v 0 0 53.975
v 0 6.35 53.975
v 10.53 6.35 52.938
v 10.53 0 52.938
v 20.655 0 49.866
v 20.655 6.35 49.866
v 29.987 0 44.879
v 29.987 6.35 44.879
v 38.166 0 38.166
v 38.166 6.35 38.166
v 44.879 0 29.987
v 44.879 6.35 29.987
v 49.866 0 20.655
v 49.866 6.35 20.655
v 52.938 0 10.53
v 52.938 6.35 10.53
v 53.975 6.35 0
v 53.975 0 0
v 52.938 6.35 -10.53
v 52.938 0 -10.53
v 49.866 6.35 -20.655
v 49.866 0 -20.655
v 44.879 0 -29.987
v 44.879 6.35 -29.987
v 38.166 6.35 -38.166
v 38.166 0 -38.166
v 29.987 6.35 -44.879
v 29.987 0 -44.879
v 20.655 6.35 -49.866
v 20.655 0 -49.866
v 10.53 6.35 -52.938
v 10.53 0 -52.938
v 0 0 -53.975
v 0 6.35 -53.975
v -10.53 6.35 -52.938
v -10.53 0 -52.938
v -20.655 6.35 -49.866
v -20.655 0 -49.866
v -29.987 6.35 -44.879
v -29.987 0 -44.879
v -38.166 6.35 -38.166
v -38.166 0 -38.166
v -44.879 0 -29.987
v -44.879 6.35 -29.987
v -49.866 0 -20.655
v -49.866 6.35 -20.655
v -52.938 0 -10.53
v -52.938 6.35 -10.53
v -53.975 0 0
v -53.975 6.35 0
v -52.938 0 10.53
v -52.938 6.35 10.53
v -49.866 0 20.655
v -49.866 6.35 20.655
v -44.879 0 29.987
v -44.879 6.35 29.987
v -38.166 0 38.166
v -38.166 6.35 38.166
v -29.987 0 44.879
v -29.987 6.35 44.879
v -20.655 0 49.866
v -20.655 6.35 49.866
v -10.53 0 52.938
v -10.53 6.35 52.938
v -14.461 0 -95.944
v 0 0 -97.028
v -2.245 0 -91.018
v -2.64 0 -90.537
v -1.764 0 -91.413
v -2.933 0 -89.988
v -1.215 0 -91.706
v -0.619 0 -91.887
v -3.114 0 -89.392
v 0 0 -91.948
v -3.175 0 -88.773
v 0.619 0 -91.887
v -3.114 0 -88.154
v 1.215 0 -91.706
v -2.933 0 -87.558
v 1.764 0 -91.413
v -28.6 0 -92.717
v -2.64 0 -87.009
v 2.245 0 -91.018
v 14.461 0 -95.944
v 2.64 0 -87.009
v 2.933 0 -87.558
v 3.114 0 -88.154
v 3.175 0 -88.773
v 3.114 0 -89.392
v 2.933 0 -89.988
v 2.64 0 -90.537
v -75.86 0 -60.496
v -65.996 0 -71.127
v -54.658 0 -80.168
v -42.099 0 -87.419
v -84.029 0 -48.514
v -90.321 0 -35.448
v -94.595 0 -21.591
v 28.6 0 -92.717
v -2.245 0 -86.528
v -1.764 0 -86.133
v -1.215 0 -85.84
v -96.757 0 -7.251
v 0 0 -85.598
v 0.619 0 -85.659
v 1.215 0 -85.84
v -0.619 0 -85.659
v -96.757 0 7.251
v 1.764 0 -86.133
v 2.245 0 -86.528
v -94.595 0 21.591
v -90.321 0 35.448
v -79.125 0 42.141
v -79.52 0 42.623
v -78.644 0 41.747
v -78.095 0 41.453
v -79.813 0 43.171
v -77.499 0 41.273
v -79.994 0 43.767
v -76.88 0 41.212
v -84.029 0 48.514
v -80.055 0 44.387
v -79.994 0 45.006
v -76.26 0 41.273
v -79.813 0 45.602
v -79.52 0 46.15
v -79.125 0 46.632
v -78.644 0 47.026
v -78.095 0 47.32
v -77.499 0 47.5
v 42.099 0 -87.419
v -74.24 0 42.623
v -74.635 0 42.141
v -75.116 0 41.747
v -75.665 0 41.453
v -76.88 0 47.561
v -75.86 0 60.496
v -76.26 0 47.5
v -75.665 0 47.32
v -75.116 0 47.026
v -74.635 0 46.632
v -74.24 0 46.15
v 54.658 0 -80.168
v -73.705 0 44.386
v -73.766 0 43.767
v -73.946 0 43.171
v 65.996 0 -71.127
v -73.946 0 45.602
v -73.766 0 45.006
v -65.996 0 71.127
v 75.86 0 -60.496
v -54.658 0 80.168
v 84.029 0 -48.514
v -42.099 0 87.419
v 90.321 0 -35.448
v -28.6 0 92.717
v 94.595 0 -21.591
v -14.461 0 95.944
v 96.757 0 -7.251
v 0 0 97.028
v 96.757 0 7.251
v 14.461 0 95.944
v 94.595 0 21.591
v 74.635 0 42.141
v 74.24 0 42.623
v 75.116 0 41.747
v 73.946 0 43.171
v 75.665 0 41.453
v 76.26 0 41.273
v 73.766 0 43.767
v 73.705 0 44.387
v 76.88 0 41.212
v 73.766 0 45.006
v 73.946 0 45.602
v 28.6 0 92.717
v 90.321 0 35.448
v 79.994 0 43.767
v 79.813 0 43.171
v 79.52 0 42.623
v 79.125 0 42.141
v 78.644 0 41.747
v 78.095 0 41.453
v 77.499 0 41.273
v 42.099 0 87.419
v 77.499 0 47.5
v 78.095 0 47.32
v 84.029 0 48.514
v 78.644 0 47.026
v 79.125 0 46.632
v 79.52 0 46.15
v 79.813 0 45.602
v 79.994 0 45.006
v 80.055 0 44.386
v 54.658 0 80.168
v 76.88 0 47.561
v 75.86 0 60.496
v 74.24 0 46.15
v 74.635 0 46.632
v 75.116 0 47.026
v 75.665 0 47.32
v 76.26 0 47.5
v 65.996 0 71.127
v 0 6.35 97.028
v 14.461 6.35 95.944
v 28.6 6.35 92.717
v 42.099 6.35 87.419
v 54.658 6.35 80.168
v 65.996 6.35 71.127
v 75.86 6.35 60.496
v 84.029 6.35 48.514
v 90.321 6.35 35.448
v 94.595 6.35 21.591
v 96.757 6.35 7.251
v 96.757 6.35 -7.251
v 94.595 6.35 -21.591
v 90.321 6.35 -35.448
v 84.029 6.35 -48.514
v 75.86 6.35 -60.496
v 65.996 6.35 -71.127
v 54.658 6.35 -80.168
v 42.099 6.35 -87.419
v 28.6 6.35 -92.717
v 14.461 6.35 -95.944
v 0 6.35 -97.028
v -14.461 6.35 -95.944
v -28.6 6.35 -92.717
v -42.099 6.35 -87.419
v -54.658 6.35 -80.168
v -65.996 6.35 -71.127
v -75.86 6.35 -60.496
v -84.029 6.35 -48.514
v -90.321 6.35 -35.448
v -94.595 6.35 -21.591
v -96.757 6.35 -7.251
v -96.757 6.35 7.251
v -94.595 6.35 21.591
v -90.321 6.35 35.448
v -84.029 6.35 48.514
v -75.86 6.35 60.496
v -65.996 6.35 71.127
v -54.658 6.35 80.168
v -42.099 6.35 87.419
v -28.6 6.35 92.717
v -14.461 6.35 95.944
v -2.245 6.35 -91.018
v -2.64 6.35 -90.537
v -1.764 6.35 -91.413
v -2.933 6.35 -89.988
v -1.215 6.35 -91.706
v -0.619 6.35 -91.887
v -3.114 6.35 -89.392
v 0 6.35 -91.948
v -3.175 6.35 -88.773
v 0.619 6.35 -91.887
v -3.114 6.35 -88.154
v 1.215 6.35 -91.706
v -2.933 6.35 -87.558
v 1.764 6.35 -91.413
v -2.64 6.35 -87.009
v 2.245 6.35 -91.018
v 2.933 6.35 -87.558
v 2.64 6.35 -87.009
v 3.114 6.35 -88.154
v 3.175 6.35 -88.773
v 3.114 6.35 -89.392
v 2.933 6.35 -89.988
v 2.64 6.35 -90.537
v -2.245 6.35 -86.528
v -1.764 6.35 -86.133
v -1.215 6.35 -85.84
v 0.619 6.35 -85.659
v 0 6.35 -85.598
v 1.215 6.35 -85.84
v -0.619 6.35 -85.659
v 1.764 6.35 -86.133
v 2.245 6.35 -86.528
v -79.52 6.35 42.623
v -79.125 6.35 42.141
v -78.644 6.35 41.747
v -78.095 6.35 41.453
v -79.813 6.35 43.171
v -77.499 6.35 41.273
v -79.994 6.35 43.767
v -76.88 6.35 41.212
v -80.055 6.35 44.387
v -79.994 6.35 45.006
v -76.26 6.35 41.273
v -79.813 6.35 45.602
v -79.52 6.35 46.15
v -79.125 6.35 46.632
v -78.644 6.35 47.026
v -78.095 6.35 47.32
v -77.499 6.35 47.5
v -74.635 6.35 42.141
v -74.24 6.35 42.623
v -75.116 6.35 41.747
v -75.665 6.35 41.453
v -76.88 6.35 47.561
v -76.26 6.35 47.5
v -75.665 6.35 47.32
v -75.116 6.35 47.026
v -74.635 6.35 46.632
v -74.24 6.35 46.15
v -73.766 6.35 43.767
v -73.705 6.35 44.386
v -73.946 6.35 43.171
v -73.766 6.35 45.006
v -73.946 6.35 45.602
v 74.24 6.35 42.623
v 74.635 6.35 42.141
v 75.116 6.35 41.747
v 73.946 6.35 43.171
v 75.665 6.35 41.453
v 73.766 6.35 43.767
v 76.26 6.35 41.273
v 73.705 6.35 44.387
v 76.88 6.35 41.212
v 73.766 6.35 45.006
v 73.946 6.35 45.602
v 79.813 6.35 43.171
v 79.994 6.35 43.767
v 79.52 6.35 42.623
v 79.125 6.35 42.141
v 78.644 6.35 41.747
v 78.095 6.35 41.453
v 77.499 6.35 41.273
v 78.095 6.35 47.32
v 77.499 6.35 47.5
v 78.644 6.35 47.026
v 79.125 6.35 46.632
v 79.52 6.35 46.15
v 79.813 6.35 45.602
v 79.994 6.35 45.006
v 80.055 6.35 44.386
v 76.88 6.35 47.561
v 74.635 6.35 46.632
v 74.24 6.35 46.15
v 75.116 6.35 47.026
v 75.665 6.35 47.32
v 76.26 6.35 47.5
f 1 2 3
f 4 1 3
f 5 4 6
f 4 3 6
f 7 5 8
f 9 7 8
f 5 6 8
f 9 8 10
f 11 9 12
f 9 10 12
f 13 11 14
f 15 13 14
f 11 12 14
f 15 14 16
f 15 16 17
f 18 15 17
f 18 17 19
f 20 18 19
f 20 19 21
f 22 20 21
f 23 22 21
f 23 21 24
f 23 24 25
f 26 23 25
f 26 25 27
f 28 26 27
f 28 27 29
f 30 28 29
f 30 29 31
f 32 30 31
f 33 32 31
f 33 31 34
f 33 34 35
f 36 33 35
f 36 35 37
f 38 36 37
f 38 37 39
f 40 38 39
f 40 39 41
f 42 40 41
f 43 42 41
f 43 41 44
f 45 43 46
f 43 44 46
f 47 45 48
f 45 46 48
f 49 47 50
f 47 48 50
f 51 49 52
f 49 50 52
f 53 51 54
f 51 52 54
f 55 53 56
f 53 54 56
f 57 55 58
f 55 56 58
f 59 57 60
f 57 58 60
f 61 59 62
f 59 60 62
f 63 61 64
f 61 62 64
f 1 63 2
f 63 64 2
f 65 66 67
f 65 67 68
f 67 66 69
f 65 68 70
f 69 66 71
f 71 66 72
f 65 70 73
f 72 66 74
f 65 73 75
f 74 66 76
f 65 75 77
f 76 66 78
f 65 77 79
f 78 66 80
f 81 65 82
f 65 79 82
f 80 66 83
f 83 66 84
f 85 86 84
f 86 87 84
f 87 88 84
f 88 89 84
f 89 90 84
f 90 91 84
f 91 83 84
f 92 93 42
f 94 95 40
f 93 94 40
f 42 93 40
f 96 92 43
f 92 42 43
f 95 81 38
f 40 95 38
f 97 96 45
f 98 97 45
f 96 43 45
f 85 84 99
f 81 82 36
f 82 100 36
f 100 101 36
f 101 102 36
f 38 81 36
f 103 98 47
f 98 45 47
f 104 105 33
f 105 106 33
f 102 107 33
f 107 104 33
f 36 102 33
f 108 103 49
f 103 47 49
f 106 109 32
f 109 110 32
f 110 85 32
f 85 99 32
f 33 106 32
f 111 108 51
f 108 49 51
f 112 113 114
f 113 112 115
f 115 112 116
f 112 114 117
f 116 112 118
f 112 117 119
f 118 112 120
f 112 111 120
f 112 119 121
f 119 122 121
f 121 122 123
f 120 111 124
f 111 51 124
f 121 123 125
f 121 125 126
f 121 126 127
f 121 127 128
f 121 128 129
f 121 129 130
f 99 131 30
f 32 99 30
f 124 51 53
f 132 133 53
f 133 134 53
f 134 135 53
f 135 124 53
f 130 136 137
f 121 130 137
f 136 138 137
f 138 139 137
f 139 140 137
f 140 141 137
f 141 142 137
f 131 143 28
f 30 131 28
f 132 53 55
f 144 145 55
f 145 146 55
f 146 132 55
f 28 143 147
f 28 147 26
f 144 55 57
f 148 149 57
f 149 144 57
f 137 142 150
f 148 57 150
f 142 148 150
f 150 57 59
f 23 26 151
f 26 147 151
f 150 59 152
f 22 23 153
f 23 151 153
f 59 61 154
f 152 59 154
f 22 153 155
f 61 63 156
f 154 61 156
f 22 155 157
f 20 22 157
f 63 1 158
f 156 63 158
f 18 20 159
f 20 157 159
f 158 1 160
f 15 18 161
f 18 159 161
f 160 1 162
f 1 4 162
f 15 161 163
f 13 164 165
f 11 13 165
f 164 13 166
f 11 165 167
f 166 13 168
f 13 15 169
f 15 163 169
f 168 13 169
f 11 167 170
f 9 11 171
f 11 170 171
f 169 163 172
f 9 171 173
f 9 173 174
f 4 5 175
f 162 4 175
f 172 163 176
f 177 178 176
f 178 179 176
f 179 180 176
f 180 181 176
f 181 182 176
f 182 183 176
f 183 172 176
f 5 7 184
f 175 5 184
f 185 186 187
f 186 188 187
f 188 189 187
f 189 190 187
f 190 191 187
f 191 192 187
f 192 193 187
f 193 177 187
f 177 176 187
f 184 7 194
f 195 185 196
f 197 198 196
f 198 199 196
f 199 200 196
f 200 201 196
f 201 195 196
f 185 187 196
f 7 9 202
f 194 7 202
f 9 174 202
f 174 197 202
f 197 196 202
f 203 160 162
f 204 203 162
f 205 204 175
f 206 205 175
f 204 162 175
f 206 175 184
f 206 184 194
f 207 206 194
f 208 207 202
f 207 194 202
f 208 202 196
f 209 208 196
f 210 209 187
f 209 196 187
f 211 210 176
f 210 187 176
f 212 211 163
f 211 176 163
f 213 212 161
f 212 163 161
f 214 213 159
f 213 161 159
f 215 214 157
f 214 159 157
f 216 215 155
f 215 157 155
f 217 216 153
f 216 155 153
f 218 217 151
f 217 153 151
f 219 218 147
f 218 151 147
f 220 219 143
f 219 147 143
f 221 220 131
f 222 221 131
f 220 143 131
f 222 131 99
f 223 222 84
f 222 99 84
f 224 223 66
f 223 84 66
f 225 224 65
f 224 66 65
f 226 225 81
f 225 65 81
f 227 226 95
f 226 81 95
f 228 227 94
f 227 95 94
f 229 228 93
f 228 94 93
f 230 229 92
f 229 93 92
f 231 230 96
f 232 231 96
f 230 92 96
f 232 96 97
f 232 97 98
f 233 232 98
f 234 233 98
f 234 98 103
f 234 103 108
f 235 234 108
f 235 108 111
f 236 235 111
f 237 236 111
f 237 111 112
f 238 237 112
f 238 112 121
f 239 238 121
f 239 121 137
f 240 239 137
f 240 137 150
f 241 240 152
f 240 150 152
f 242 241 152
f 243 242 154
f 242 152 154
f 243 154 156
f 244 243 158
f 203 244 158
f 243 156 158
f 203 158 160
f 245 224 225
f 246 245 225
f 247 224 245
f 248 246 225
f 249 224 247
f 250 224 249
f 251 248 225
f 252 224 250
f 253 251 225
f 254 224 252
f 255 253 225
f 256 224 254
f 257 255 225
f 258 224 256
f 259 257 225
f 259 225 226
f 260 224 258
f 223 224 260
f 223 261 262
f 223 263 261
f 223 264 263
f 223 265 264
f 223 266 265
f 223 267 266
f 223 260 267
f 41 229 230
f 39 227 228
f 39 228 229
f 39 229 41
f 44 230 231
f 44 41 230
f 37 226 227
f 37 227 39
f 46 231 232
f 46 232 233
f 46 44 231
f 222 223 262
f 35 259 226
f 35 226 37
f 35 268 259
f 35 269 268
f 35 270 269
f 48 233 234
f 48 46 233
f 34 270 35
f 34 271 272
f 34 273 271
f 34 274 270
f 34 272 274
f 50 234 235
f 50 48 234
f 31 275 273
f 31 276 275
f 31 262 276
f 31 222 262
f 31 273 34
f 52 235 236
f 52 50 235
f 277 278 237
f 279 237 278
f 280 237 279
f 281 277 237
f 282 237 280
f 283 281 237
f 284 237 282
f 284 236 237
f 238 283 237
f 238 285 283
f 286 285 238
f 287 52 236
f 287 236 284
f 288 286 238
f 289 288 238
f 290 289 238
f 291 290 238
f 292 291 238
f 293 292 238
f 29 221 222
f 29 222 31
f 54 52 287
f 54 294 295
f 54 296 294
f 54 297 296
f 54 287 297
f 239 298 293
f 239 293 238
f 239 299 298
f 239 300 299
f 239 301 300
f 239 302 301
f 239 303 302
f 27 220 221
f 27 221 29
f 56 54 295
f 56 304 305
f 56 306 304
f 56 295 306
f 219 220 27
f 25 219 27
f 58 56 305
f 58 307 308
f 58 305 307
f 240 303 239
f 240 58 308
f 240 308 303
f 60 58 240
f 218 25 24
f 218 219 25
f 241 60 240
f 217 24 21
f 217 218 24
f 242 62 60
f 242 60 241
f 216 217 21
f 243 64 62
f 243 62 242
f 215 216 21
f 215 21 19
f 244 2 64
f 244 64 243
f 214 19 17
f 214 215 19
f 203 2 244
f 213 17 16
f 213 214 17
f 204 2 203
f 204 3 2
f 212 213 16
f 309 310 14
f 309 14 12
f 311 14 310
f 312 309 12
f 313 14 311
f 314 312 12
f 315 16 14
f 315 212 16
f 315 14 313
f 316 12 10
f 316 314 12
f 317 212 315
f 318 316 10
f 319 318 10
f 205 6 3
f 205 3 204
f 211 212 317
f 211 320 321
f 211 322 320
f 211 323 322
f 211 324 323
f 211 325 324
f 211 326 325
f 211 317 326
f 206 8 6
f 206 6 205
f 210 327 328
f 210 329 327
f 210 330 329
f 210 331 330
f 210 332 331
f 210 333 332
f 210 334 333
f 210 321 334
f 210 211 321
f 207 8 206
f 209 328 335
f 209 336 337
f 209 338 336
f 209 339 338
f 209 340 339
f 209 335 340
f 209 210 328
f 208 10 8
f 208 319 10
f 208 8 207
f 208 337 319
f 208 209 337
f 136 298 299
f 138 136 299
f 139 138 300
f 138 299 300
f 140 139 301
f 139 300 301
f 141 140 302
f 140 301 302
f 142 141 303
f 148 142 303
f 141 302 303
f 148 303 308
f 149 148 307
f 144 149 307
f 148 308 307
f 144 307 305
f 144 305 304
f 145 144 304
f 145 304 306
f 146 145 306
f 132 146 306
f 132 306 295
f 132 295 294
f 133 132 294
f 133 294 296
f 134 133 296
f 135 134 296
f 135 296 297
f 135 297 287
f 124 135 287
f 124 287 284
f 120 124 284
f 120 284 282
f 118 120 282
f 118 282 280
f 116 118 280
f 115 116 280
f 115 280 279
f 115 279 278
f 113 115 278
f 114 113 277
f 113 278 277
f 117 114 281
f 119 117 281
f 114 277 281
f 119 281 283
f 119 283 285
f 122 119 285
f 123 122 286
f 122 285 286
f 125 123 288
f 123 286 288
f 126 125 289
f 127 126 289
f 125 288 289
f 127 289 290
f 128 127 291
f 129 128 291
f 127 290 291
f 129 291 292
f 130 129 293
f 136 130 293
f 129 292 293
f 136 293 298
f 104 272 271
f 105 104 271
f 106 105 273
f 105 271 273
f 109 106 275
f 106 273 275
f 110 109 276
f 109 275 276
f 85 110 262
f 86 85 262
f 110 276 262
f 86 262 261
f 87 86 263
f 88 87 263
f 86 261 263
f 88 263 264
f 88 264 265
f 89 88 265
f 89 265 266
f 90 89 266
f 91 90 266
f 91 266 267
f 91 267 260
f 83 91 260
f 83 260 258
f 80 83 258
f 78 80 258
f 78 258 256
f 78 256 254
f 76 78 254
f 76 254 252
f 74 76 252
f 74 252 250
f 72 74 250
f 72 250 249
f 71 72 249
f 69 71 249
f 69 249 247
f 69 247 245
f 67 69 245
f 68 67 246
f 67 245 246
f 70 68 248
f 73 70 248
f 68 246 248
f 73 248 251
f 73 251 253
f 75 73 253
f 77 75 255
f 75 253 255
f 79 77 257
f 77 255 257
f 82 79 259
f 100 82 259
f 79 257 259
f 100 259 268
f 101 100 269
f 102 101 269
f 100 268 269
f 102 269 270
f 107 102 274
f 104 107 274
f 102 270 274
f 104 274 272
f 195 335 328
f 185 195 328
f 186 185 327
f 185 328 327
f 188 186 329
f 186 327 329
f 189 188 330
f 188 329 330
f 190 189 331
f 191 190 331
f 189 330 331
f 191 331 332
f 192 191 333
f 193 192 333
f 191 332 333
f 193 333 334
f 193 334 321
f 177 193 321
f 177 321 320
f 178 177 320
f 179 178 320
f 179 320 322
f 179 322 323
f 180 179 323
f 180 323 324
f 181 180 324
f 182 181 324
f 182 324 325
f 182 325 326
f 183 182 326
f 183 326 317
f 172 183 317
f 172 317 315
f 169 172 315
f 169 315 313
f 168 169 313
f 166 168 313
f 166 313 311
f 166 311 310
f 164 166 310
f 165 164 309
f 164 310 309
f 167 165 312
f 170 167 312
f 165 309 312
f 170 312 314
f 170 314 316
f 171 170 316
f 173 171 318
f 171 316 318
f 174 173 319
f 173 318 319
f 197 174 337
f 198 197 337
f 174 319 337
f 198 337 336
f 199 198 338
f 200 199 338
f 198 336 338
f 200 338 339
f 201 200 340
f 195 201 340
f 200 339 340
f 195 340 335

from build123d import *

# Parameters (mm, degrees)
SKETCH1_R           = 97.028
BOSS_EXTRUDE1_DEPTH = 6.35
SKETCH2_R           = 3.175
CUT_EXTRUDE1_DEPTH  = 138.365163226
SKETCH3_R           = 53.975
CUT_EXTRUDE2_DEPTH  = 138.365163226


with BuildPart() as part:
    # Sketch1 → Boss-Extrude1 (new body)
    with BuildSketch(Plane(origin=(0, 0, 0), x_dir=(1, 0, 0), z_dir=(0, 1, 0))):
        with Locations(Location((0, 0, 0), (0, 0, 270))):
            Circle(SKETCH1_R)
    extrude(amount=BOSS_EXTRUDE1_DEPTH)

    # Sketch2 → Cut-Extrude1 (cut, through all)
    with BuildSketch(Plane(origin=(0, 6.35, 0), x_dir=(1, 0, 0), z_dir=(0, 1, 0))):
        with Locations(Location((0, 88.773, 0), (0, 0, 270))):
            Circle(SKETCH2_R)
        with Locations(Location((76.87967317, -44.3865, 0), (0, 0, 270))):
            Circle(SKETCH2_R)
        with Locations(Location((-76.87967317, -44.3865, 0), (0, 0, 270))):
            Circle(SKETCH2_R)
    extrude(amount=-CUT_EXTRUDE1_DEPTH, mode=Mode.SUBTRACT)

    # Sketch3 → Cut-Extrude2 (cut, through all)
    with BuildSketch(Plane(origin=(0, 6.35, 0), x_dir=(1, 0, 0), z_dir=(0, 1, 0))):
        with Locations(Location((0, 0, 0), (0, 0, 270))):
            Circle(SKETCH3_R)
    extrude(amount=-CUT_EXTRUDE2_DEPTH, mode=Mode.SUBTRACT)


solid = part.part
